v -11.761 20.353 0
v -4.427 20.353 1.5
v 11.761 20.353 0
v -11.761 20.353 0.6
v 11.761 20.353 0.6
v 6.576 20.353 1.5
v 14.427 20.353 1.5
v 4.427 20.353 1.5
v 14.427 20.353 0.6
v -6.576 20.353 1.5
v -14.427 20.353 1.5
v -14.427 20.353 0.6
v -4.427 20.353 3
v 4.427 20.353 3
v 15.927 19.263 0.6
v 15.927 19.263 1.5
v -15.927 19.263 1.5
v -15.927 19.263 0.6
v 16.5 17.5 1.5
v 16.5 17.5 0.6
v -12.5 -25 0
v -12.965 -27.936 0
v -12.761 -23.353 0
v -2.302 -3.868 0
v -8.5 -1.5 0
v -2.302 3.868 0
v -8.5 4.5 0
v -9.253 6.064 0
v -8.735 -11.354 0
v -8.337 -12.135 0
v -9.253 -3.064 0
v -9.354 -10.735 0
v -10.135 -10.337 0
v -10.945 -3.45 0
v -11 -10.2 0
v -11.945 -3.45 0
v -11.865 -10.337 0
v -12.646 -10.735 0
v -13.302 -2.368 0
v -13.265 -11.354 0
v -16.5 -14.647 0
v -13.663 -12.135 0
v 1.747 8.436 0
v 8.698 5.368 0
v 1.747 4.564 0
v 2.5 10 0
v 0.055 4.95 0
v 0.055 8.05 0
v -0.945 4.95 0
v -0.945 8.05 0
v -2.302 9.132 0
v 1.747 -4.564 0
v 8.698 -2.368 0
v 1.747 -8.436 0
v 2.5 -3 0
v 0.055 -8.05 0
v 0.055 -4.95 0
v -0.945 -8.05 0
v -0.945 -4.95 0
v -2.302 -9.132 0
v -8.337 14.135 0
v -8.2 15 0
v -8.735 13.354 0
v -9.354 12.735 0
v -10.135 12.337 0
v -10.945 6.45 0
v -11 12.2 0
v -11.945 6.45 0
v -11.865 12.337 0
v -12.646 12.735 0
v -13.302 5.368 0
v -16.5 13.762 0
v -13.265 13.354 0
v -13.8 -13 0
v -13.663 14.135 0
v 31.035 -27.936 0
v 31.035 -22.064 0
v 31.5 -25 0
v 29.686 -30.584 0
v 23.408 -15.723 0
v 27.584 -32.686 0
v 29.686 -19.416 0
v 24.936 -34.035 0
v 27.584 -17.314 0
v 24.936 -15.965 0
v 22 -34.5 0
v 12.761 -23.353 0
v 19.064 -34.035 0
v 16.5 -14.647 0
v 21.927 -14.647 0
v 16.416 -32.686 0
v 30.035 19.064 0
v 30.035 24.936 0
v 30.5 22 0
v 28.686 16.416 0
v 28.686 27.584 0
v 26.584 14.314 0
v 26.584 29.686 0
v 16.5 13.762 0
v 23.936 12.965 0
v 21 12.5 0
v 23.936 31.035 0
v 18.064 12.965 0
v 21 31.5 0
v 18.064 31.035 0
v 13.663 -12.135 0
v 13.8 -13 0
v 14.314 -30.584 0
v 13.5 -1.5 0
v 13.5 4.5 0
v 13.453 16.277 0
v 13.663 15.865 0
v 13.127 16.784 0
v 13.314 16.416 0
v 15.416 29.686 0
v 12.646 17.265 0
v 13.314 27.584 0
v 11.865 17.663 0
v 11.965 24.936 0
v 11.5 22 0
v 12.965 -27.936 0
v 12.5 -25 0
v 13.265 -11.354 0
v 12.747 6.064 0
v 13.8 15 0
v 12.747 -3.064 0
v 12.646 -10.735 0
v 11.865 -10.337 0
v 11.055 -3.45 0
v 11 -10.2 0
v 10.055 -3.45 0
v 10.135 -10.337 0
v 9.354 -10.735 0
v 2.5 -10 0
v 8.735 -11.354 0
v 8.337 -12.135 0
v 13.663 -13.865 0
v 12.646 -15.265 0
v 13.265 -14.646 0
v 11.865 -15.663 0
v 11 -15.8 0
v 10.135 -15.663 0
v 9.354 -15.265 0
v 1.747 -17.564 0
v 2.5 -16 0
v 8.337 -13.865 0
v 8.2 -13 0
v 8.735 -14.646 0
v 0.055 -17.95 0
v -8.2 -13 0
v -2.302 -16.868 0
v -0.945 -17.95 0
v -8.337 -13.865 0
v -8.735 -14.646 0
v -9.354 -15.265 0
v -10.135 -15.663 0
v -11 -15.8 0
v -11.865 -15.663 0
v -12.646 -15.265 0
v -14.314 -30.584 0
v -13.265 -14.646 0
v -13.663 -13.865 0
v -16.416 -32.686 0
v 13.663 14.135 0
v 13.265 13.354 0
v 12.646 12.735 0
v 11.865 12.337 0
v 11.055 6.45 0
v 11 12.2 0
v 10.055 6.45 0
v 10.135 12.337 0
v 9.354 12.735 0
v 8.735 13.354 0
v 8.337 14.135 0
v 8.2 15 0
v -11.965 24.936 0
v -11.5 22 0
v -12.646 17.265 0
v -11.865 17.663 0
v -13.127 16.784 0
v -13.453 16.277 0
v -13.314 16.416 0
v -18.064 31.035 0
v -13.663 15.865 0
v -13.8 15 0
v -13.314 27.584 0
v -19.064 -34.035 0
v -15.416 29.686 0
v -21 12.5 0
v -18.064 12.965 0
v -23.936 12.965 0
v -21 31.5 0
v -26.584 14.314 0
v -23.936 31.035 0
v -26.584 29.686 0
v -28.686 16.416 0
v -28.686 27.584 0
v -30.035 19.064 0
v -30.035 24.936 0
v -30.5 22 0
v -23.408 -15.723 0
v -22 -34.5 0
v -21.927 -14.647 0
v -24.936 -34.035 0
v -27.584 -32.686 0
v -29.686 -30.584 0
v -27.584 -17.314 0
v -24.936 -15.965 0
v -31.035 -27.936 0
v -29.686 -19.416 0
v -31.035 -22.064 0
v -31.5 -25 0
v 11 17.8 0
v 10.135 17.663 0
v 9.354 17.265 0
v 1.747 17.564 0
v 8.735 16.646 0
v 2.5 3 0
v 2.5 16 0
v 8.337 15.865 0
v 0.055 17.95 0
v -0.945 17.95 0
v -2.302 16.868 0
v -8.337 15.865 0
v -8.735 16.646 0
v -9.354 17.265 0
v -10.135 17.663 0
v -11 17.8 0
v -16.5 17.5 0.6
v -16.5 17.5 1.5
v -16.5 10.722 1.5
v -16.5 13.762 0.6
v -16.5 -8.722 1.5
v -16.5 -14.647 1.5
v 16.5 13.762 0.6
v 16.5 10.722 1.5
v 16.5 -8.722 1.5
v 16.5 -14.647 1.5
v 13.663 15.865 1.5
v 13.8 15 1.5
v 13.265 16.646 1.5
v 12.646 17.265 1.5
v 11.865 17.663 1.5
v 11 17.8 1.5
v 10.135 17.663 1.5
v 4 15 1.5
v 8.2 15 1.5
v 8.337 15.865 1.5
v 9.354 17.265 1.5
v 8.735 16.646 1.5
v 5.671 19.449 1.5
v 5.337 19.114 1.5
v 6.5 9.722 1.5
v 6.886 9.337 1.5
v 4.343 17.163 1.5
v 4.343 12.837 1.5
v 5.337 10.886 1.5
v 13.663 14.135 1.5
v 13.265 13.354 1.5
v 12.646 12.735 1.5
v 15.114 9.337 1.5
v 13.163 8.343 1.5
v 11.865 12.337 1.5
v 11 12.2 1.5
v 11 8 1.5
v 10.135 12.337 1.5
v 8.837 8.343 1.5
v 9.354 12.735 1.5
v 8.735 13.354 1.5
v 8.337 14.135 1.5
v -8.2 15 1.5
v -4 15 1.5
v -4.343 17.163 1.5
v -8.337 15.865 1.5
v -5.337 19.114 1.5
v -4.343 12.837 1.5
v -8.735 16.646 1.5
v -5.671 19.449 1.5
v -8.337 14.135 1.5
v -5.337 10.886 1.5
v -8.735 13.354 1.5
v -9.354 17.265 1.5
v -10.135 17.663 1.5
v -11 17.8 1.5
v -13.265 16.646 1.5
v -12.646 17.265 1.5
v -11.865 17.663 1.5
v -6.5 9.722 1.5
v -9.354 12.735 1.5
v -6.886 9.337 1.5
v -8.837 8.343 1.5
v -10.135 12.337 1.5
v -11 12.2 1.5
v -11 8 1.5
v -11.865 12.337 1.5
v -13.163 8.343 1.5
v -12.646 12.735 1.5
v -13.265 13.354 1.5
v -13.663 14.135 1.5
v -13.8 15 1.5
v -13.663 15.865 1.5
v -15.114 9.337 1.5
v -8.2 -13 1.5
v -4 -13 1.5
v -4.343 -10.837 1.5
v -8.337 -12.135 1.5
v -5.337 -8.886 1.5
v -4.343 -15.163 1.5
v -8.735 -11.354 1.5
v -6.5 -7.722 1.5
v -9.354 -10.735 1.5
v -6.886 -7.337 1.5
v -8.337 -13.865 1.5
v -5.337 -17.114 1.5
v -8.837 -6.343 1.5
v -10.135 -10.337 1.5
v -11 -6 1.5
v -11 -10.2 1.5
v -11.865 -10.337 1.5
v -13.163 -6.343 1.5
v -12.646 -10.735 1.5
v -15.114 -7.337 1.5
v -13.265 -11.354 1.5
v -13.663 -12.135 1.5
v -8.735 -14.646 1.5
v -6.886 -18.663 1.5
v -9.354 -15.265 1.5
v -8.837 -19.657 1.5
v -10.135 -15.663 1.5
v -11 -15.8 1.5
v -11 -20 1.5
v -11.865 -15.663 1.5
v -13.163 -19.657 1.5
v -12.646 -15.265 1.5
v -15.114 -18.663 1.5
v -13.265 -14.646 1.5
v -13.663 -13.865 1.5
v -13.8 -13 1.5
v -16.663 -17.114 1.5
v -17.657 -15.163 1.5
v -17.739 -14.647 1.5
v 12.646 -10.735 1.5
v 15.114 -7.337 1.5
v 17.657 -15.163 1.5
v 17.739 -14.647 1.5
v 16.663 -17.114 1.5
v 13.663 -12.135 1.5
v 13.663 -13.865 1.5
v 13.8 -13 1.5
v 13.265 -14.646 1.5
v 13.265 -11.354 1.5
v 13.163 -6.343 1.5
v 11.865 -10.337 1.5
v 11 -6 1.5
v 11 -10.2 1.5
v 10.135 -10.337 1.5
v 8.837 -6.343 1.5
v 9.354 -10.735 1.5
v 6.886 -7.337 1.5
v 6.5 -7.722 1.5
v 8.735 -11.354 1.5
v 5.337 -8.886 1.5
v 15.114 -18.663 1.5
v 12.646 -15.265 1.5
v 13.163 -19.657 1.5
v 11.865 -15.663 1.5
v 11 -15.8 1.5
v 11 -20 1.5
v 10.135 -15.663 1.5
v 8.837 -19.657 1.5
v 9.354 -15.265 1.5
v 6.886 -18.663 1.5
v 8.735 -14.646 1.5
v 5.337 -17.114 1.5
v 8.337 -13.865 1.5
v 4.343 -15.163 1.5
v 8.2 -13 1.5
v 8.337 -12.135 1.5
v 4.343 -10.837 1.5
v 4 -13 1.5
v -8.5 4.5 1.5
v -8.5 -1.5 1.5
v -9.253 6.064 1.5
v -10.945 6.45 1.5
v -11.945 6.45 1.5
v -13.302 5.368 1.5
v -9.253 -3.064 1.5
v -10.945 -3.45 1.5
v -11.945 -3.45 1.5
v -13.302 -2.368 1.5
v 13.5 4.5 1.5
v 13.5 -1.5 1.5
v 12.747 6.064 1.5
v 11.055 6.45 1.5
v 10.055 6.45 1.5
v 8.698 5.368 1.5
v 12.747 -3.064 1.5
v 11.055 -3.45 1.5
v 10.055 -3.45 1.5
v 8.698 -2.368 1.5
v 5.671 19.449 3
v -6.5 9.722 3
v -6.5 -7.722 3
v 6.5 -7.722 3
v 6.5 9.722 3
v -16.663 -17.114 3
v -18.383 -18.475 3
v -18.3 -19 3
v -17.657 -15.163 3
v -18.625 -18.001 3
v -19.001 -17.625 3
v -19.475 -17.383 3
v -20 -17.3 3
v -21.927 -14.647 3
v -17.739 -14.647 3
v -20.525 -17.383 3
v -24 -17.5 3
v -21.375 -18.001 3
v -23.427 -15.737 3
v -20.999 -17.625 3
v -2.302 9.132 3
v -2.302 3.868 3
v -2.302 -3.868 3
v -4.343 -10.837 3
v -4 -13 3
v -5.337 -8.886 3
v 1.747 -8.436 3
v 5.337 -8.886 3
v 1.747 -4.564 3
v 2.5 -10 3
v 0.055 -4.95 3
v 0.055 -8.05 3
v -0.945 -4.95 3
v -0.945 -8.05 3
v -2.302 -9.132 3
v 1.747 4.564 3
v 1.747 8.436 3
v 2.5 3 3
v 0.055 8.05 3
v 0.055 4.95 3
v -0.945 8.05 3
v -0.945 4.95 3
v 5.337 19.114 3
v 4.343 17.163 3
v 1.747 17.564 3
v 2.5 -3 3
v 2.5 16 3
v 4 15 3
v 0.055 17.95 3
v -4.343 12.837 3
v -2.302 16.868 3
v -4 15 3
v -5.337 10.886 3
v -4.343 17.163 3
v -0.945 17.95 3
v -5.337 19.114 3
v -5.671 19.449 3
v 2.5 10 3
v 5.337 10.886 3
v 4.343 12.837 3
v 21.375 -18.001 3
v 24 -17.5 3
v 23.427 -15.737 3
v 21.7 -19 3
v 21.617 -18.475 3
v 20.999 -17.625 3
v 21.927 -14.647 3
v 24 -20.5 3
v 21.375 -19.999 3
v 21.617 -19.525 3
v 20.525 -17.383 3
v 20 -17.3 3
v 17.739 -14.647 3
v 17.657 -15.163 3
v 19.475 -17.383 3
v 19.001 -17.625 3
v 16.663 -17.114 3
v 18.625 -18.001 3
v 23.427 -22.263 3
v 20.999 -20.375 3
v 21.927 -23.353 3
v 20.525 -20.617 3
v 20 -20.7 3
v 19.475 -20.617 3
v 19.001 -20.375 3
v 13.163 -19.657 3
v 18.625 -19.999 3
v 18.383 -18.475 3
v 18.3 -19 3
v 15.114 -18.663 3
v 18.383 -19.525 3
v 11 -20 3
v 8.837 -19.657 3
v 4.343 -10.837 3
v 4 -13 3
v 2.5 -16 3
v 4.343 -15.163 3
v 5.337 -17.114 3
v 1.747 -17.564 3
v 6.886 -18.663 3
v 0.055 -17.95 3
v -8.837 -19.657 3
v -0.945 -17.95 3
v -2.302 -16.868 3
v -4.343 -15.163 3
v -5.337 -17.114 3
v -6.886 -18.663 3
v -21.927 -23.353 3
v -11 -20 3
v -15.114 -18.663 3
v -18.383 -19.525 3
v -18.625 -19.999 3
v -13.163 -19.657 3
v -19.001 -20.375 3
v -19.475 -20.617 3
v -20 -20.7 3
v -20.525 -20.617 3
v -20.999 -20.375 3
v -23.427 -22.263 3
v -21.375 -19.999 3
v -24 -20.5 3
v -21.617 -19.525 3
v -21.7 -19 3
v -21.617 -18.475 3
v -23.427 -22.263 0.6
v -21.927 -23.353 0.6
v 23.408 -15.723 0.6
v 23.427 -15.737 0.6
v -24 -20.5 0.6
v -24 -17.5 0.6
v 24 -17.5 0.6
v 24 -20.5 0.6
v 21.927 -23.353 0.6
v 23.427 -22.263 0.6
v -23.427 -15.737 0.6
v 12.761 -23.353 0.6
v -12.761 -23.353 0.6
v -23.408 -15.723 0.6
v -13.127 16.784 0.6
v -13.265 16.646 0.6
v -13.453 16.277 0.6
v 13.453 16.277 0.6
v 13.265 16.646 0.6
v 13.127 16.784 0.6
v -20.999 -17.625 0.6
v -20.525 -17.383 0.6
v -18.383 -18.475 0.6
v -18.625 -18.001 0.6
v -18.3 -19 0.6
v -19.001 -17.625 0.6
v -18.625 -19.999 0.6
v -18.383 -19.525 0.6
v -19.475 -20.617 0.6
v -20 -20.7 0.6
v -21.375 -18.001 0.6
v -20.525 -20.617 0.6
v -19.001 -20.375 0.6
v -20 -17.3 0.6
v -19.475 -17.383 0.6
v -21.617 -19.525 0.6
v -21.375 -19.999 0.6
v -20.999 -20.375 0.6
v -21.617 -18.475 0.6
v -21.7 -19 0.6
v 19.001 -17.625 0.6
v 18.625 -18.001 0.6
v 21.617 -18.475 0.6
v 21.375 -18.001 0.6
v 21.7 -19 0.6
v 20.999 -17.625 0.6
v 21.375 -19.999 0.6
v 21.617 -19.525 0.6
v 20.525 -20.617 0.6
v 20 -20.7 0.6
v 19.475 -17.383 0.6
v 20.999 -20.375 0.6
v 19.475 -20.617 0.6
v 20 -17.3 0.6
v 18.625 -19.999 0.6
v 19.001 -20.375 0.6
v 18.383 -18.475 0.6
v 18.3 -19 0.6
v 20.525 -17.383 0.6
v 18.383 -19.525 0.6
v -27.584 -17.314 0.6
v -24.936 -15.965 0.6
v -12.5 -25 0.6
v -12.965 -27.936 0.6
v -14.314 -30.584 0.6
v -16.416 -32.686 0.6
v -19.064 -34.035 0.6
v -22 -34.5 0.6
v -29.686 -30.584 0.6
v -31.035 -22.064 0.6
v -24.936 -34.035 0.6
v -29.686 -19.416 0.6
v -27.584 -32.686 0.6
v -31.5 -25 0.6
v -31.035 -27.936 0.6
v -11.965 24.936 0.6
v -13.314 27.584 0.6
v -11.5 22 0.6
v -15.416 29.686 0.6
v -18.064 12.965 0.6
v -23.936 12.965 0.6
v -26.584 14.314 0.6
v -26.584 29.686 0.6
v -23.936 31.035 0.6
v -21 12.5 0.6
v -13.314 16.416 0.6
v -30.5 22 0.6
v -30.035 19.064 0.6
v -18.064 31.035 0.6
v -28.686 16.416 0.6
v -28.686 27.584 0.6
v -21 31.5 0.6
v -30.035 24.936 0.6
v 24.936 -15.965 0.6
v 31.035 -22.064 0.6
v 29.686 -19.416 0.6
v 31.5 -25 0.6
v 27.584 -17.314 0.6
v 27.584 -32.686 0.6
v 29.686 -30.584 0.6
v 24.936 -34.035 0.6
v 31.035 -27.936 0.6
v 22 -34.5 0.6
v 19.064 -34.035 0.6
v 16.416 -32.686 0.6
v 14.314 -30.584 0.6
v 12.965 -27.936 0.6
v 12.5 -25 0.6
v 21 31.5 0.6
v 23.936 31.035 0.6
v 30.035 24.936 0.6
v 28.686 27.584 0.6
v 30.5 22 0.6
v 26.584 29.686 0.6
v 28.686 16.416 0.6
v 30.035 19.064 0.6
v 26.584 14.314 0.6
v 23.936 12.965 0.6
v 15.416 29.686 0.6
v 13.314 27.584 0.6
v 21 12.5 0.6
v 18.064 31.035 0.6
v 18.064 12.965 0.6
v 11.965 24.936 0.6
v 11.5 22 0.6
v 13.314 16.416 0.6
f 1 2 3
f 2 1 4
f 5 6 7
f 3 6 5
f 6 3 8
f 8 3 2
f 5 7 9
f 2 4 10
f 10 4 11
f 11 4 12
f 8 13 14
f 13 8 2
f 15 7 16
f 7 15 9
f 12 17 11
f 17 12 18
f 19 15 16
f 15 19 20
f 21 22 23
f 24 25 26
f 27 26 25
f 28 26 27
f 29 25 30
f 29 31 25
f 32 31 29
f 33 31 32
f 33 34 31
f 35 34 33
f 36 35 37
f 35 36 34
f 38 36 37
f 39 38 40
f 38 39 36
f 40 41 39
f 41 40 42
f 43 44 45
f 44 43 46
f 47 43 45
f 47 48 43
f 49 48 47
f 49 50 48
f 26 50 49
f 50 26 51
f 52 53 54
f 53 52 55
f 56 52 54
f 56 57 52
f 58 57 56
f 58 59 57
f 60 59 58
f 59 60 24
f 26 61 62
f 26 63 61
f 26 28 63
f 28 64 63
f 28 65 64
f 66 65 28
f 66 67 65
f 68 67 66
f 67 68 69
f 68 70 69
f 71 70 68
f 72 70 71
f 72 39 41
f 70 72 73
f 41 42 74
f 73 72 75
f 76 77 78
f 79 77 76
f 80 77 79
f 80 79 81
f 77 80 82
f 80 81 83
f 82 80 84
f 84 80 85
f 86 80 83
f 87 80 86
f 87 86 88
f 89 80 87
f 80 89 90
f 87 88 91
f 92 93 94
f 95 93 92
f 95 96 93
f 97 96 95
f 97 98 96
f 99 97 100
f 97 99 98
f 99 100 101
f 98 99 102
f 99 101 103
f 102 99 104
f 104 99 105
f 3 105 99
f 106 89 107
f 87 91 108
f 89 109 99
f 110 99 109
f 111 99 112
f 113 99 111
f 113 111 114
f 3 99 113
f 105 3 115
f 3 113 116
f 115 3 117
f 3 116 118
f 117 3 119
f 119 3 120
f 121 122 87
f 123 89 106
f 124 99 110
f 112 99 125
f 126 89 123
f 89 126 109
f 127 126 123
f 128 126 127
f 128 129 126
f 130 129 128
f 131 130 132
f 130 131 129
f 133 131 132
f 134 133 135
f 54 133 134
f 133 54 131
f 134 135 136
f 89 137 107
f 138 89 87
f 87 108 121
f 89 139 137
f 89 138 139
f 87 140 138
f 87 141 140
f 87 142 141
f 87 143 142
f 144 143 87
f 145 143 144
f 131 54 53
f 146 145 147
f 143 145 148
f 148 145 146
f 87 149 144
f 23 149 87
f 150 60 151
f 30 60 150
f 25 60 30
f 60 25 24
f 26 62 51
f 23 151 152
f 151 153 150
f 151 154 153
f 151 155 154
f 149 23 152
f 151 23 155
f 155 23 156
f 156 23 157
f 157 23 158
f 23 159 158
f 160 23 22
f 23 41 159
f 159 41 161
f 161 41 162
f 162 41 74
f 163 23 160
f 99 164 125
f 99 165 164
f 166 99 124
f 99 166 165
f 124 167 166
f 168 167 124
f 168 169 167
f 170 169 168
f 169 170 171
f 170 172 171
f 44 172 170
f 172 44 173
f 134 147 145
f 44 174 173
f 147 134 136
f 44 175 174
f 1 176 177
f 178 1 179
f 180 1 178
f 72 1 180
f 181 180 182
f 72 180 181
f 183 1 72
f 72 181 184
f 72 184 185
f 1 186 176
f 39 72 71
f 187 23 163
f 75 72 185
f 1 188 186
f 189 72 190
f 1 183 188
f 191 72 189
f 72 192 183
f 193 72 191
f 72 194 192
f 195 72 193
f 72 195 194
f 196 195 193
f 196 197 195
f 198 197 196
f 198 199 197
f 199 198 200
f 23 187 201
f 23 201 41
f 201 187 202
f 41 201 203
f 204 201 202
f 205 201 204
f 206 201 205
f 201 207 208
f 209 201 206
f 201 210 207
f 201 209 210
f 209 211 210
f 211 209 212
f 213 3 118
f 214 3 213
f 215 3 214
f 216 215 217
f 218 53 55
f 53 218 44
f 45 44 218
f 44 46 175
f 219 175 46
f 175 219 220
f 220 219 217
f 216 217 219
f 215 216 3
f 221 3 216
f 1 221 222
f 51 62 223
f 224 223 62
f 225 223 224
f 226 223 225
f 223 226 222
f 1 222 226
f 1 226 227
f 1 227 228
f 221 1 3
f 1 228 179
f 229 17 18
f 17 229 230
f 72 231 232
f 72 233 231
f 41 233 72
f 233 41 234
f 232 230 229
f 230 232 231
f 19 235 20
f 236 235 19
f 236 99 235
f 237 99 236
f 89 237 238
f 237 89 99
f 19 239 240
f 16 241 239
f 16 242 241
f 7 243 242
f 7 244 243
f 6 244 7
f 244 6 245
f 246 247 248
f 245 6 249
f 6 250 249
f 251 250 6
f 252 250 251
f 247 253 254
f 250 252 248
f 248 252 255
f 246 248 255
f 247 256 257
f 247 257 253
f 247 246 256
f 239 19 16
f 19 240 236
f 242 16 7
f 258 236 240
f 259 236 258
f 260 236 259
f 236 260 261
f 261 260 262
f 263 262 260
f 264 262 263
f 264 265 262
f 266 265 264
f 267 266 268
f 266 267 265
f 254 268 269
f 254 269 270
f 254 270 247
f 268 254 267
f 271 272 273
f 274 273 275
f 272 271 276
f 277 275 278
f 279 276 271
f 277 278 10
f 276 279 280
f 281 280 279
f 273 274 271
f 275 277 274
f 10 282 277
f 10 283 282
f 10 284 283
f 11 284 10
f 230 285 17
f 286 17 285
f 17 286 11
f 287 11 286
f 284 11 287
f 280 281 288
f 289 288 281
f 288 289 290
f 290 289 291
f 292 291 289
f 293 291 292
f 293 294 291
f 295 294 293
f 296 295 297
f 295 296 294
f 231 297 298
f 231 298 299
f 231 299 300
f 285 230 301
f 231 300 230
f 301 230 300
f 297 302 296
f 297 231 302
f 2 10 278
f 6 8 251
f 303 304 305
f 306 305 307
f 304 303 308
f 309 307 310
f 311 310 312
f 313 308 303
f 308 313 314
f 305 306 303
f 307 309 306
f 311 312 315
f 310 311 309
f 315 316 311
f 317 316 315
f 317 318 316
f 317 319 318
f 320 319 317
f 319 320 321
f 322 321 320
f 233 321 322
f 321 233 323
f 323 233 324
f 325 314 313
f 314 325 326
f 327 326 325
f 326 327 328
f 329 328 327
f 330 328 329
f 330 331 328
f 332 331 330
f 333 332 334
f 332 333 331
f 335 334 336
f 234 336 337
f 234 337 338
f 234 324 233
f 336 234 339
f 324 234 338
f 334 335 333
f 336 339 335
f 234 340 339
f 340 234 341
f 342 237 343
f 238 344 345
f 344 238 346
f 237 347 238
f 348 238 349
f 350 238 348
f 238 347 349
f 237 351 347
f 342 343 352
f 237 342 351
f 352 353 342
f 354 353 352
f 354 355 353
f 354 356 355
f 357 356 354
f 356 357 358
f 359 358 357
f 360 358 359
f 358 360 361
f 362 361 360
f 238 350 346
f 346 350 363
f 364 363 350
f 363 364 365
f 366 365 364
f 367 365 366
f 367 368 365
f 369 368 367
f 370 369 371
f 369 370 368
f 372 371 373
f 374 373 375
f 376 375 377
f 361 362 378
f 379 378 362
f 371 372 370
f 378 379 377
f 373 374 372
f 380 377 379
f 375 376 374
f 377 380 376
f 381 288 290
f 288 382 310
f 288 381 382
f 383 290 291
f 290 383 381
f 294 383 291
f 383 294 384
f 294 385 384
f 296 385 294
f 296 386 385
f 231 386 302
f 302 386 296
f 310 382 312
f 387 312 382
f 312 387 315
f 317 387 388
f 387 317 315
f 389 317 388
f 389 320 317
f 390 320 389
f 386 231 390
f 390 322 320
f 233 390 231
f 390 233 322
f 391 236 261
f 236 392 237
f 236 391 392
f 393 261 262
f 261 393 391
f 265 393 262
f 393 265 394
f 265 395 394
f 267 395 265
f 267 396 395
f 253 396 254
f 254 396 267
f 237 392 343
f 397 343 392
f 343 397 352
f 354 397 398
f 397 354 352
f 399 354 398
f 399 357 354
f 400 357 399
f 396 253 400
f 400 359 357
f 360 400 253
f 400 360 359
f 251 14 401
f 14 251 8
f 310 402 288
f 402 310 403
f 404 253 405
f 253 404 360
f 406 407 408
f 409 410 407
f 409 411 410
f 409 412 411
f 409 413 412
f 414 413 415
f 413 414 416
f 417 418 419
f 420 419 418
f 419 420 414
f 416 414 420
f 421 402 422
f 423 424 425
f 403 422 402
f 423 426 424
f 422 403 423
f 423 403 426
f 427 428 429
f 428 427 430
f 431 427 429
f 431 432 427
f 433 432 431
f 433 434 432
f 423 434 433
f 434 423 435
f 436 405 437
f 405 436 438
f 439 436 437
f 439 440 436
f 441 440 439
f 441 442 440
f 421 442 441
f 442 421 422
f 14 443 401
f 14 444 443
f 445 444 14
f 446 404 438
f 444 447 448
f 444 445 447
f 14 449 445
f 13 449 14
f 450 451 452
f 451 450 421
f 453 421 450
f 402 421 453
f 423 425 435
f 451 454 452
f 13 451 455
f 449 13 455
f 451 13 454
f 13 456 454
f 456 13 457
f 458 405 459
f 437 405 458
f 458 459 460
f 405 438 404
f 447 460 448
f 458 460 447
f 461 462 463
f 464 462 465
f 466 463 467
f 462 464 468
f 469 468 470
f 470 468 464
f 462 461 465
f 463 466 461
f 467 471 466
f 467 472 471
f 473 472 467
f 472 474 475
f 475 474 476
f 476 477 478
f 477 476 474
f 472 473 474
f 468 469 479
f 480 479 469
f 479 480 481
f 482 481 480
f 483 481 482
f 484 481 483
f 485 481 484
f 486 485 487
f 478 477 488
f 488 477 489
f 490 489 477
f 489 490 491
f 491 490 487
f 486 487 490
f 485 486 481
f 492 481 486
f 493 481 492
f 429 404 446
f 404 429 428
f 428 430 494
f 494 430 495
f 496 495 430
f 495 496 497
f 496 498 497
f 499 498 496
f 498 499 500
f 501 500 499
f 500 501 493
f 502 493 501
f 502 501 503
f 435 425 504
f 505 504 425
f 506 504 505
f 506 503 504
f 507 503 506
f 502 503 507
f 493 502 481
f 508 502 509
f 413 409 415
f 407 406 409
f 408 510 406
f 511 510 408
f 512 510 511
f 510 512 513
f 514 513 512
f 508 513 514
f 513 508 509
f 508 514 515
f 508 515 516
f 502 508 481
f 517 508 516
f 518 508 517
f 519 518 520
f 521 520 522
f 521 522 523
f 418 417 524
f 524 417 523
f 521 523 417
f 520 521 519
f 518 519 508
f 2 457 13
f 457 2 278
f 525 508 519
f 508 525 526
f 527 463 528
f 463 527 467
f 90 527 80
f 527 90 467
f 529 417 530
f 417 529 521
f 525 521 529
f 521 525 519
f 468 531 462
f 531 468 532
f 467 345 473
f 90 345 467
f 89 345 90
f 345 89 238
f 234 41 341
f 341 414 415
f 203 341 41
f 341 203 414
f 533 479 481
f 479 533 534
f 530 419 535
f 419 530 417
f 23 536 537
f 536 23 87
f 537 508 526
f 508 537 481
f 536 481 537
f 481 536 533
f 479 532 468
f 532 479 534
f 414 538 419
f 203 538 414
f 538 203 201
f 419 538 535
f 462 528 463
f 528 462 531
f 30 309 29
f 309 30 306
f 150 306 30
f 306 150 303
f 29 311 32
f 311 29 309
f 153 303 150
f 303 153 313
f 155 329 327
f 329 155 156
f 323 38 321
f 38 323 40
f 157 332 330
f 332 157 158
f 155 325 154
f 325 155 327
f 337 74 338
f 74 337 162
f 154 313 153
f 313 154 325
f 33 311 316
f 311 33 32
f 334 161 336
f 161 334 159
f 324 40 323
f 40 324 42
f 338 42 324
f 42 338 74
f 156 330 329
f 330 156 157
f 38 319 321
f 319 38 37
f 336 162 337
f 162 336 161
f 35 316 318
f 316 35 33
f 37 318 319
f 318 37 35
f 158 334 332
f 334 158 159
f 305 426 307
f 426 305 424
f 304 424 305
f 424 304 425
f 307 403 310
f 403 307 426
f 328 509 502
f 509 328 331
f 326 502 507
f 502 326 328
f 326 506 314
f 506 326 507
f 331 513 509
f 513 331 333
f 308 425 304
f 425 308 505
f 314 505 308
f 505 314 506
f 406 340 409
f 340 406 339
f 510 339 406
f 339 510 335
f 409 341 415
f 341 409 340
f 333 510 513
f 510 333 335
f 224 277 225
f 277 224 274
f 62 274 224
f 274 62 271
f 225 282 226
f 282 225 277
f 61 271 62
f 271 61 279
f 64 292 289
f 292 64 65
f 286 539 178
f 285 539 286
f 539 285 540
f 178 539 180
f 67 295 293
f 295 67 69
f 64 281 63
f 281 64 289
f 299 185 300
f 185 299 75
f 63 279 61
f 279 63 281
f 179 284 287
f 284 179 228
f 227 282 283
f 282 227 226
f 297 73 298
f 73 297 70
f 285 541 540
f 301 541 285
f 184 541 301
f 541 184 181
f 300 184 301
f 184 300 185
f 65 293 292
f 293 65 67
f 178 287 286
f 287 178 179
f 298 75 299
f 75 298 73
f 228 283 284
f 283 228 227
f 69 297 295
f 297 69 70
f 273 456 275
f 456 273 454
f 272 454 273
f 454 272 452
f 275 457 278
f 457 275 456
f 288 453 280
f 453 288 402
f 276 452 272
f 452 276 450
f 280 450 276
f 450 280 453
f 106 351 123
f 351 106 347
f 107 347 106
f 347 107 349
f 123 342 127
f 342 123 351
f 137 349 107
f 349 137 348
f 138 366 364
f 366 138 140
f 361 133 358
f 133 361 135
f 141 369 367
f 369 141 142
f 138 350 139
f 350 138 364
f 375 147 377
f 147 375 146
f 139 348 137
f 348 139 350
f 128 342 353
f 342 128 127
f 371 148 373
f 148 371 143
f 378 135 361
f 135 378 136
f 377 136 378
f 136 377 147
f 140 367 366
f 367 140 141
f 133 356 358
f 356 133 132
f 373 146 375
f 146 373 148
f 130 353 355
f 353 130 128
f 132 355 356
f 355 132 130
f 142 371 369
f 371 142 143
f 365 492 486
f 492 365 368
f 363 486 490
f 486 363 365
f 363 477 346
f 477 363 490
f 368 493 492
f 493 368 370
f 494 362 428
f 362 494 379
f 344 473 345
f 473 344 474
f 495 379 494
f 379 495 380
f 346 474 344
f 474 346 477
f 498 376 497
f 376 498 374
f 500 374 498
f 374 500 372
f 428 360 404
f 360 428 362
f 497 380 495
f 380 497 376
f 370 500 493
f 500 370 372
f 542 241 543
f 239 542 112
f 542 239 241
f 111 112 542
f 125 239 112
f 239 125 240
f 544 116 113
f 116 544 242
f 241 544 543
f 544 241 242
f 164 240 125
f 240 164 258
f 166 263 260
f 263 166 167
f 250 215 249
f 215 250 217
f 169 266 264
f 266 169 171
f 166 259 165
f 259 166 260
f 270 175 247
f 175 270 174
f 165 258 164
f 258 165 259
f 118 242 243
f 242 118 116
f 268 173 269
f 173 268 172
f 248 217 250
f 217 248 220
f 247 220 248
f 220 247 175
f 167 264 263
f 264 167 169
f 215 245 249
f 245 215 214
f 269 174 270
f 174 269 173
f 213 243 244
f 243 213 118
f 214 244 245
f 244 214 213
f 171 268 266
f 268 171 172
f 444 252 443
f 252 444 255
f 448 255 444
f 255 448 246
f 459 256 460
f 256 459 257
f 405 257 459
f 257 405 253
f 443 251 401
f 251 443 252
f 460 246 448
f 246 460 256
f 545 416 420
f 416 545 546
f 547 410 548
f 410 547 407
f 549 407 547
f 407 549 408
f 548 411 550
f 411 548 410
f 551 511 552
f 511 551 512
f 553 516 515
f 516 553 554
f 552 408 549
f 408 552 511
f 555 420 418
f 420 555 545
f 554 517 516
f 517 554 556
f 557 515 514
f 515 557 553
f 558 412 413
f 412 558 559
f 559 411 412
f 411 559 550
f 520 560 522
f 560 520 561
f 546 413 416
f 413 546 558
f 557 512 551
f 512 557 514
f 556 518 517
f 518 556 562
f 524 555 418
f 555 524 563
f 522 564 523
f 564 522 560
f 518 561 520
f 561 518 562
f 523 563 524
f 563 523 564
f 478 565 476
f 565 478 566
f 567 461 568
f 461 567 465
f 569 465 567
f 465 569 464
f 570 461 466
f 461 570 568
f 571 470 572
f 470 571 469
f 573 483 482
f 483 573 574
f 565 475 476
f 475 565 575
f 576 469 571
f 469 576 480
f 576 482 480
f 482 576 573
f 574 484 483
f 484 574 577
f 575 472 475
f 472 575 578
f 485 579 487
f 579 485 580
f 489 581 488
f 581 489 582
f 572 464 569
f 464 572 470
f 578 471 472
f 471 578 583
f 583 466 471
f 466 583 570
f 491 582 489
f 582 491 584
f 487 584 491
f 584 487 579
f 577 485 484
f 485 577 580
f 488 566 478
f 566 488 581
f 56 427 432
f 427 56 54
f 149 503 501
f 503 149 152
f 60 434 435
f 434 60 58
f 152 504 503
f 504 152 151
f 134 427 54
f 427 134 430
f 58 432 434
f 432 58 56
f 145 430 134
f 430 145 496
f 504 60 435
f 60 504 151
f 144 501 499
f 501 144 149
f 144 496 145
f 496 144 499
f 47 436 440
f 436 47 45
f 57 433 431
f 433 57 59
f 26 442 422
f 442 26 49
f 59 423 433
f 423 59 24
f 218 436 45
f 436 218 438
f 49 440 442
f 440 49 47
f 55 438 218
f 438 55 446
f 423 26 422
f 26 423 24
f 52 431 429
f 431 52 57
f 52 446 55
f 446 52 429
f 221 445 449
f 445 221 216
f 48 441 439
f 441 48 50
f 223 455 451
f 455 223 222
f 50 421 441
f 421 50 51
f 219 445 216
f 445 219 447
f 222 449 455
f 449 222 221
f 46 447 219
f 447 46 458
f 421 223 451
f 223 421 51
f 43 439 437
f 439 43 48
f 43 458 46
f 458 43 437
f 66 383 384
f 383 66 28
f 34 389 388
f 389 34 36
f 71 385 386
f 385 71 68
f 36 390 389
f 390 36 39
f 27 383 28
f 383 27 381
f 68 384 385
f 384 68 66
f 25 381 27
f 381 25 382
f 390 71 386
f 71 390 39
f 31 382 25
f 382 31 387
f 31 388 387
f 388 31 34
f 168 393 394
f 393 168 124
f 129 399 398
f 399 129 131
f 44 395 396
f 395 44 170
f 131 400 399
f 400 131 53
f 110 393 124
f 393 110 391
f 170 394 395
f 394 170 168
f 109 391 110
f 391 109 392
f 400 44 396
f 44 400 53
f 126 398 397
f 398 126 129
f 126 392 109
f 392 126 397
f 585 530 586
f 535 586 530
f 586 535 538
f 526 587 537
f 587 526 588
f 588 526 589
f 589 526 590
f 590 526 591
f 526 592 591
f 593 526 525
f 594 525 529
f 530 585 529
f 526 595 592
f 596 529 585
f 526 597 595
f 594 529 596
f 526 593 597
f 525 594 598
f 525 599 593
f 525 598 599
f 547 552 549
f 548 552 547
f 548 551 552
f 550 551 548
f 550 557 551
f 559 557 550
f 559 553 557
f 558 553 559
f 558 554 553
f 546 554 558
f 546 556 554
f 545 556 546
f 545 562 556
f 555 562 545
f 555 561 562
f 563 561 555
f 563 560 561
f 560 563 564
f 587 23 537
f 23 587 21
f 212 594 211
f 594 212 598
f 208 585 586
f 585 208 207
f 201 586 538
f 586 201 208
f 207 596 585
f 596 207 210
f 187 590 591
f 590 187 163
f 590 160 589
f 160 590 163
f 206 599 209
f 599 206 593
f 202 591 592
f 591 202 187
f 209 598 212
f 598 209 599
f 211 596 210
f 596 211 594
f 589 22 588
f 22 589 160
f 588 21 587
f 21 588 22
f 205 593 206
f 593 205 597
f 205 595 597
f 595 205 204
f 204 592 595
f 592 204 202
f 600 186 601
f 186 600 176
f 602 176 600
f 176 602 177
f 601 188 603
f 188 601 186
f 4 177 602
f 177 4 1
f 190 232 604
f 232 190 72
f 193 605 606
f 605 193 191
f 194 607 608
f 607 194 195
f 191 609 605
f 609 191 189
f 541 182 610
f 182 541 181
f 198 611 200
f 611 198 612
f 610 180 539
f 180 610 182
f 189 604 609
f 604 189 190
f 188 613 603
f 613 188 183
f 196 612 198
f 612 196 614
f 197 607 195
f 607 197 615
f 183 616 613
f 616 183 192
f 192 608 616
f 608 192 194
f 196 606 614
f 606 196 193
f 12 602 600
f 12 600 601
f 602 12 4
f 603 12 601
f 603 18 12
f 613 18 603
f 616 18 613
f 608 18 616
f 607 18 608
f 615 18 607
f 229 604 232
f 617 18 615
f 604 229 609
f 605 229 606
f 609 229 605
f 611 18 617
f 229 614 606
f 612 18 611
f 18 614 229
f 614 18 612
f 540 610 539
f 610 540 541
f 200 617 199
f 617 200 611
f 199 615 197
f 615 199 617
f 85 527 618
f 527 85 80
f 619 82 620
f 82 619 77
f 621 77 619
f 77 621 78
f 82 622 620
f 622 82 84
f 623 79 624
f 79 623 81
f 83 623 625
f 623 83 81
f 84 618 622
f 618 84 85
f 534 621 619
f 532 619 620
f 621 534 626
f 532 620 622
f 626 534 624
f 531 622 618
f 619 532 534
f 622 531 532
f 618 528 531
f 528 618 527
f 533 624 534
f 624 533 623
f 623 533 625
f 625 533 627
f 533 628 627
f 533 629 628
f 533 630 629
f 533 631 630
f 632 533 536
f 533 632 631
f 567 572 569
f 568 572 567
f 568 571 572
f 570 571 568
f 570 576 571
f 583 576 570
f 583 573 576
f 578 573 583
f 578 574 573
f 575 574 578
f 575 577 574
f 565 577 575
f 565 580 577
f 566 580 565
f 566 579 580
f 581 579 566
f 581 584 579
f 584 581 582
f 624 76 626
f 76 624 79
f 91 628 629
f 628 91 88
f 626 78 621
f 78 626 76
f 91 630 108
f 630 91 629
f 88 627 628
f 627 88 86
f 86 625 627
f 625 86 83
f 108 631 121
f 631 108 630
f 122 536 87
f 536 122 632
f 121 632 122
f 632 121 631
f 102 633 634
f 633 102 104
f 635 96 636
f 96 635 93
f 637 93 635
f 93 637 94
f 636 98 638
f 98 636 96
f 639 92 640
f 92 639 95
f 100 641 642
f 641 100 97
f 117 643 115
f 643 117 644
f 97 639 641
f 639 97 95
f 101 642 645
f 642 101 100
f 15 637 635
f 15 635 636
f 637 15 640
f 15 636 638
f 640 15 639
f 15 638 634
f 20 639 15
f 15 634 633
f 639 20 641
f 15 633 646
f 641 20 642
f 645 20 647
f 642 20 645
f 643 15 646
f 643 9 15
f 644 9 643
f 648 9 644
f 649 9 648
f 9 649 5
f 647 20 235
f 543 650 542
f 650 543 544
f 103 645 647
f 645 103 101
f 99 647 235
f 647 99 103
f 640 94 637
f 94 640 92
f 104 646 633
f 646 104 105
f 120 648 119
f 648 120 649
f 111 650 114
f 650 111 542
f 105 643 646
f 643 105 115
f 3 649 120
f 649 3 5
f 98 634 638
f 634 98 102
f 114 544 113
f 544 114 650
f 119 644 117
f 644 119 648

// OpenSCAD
// file: dronePlates.scad
/**
 * dronePlates.scad
 * Plate library
 *
 * GNU GPL V3
 * @author: Victor Potenciano
 */

m3Rad = 3.4/2;
cornerR = 4;

/**
 *
 */
module helperDisk(diameter) {
	cylinder(r = diameter/2, h = 0.6, $fn=20);
}

/**
 *
 */
module roundedRect(size, radius) {
	x = size[0];
	y = size[1];
	z = size[2];

	linear_extrude(height=z)
	hull() {
	// place 4 circles in the corners, with the given radius
	translate([(-x/2)+(radius/2), (-y/2)+(radius/2), 0]){ circle(r=radius); }
	translate([(x/2)-(radius/2), (-y/2)+(radius/2), 0]){ circle(r=radius); }
	translate([(-x/2)+(radius/2), (y/2)-(radius/2), 0]){ circle(r=radius); }
	translate([(x/2)-(radius/2), (y/2)-(radius/2), 0]){ circle(r=radius); }
	}
}

/**
 * rounded rectangle triangle with corner at origin
 */
module roundedTriangle(size, radius) {
	x = size[0];
	y = size[1];
	z = size[2];

	linear_extrude(height=z)
	hull() {
	translate([radius, radius, 0]){ circle(r=radius); }
	translate([x-radius, radius, 0]){ circle(r=radius); }
	translate([radius, y-radius, 0]){ circle(r=radius); }
	}
}

/**
 *
 */
module roundRectPlate(w, l, plateThick=3) {
	difference(){
		roundedRect([l+m3Rad*1.75,w+m3Rad*1.75,plateThick], cornerR);
		translate([l/2, w/2, -0.5]) { cylinder(h = plateThick+1, r = m3Rad, $fn=30); }
		translate([-l/2, w/2, -0.5]) { cylinder(h = plateThick+1, r = m3Rad, $fn=30); }
		translate([l/2, -w/2, -0.5]) { cylinder(h = plateThick+1, r = m3Rad, $fn=30); }
		translate([-l/2, -w/2, -0.5]) { cylinder(h = plateThick+1, r = m3Rad, $fn=30); }
	}
}

/**
 *
 */
module crossSquarePlate(l, thick=3) {
	inDist = cornerR*2+4;
	trianL = sqrt((l*l)/2)-inDist;
	centerR = 4;

	difference(){
		roundRectPlate(l, l, thick);
		translate([0, centerR, -0.5]) { 
			rotate([0,0,45]){ roundedTriangle([trianL,trianL,thick+1], cornerR-2); }
		}
		translate([0, -centerR, -0.5]) { 
			rotate([0,0,225]){ roundedTriangle([trianL,trianL,thick+1], cornerR-2); }
		}
		translate([-centerR, 0, -0.5]) { 
			rotate([0,0,135]){ roundedTriangle([trianL,trianL,thick+1], cornerR-2); }
		}
		translate([centerR, 0, -0.5]) { 
			rotate([0,0,-45]){ roundedTriangle([trianL,trianL,thick+1], cornerR-2); }
		}
	}
}

/**
 *
 */
module hShapePlate(w, l, thick=4) {
	inDist = cornerR*2+1;

	difference(){
		roundRectPlate(w, l, thick);
		translate([0, w/4, -0.5]) { roundedRect([l-inDist,w/2-inDist,thick+1], cornerR-2); }
		translate([0, -w/4, -0.5]) { roundedRect([l-inDist,w/2-inDist,thick+1], cornerR-2); }
	}
}

/**
 *
 */
module motorCircleMount(inDia, outDia, thick=3, extraH=false, d1=19, d2=16, holeR=m3Rad ) {
	difference(){
		cylinder(h = thick, r = outDia/2, $fn=30);
		motorCircleMountHoles(inDia, outDia, thick, extraH, d1=d1, d2=d2, holeR=holeR);
	}
}

/**
 *
 */
module motorCircleMountHoles(inDia, outDia, thick=3, extraH=false, d1=19, d2=16, d3=25, holeR=m3Rad) {
	translate([0, 0, -0.5]) { cylinder(h = thick+1, r = inDia/2, $fn=30); }

	for(i=[0:3]) {
		rotate([0,0,90*i]){
		translate([d1/2, 0, -0.5]) cylinder(h = thick+1, r = holeR, $fn=20);
		translate([d2/2, 0, -0.5]) cylinder(h = thick+1, r = holeR, $fn=20);
		translate([d2/2, -holeR, -0.5]) cube(size = [(d1-d2)/2,holeR*2,thick+1]);
		}
	}
	
	if(extraH==true){	
		for(i=[-1,1]) translate([i*d3/2, 0, -0.5]) { cylinder(h = thick+1, r = holeR, $fn=30); }
	}
}

/**
 *
 */
module motorRectMount(w, l, inDia, thick=3) {
	d1=19;
	d2=16;

	difference(){
		roundRectPlate(w, l, thick);
		translate([0, 0, -0.5]) { cylinder(h = thick+1, r = inDia/2, $fn=30); }
		translate([0, d1/2, -0.5]) { cylinder(h = thick+1, r = m3Rad, $fn=30); }
		translate([0, -d1/2, -0.5]) { cylinder(h = thick+1, r = m3Rad, $fn=30); }
		translate([d2/2, 0, -0.5]) { cylinder(h = thick+1, r = m3Rad, $fn=30); }
		translate([-d2/2, 0, -0.5]) { cylinder(h = thick+1, r = m3Rad, $fn=30); }
	}
}

/**
 *
 */
module tube(inDia, outDia, height) {
	difference(){
		cylinder(h = height, r = outDia/2, $fn=50);
		translate([0, 0, -0.5]) { cylinder(h = height+1, r = inDia/2, $fn=30); }
	}
}

/**
 *
 */
module squareTube(inDia, outDia, height) {
	translate([0,0,height/2]){
	difference(){
		cube(size = [outDia,outDia,height], center = true);
		cube(size = [inDia,inDia,height+1], center = true);
	}
	}
}

/**
 *
 */
module djiFlamewheelHoles(height) {
	a = 23;
	b = 16;
	c = 19.5;
	
	translate([a/2, c/2, 0]) { cylinder(h = height, r = m3Rad, $fn=30); }
	translate([-a/2, c/2, 0]) { cylinder(h = height, r = m3Rad, $fn=30); }
	translate([b/2, -c/2, 0]) { cylinder(h = height, r = m3Rad, $fn=30); }
	translate([-b/2, -c/2, 0]) { cylinder(h = height, r = m3Rad, $fn=30); }
}

/**
 *
 */
module djiFlamewheelHolesBotton(height) {
	a1 = 21;
	c = 19.5;
	
	translate([a1/2, c/2, 0]) { cylinder(h = height, r = m3Rad, $fn=30); }
	translate([-a1/2, c/2, 0]) { cylinder(h = height, r = m3Rad, $fn=30); }
}

/**
 *
 */
module propeller(size){
union(){
difference(){
	cylinder(h = 3, r = size/2, center=true, $fn=30);
	cylinder(h = 3.1, r = size/2-2, center=true, $fn=30); 
}
for( i = [-1,1] ){
rotate([0,0,45*i]){ cube(size = [size,4,1], center = true); }
}
}
}

/**
 *
 */
module slot(length, height, rad){
for(i=[-1,1]) translate([i*length/2,0,0]) cylinder(h = height, r = rad, $fn=30);
translate([0,0,height/2]) cube(size = [length,rad*2,height], center = true);
}

 

////////////////////////
// Examples:
////////////////////////

motorCircleMount(8, 25, 3.5);

//roundedRect([50,50,3], 4);

//hShapePlate(79, 25);

//rotate([0,0,45]){roundedTriangle([40,40,3], 4);}

//crossSquarePlate(45, 4);

/*
union(){
motorRectMount(21, 18, 8, 4);
translate([9, 10.5, 0]) {tube(m3Rad*2, 6.5, 6);}
}
*/

/*
difference(){
union(){
hShapePlate(50, 30, 3.5);
translate([-4,-25,0]){cube(size = [8,50,3.5]);}
rotate([0, 0, 45]) {motorCircleMount(8, 35, 3.5);}
}
cylinder(h = 10, r = 4, $fn=100, center=true);
}
*/

//rotate([90,0,0]){ tube(5,10,20); }
//translate([20,0,0]){ squareTube(5, 10, 20); }
// main file
/**
 * top mount for mobius using zmr250 pattern
 */

use <dronePlates.scad>;

m3Rad = 3.4/2;
plateThick = 1.5;
frHolesD = 19;

difference(){
union(){
	roundedRect([30,38,plateThick],3);
	roundedRect([10,38,plateThick+1.5],3);
	translate([0,-frHolesD,0]) roundedRect([45,6,plateThick+1.5],3);
}

translate([0,1,0])
for ( i = [-1,1]) for ( j = [-1,1]){ //mobius bobbins holes
	translate([i*22/2,j*28/2,-0.5]){
		cylinder(r=5.6/2,h=plateThick+1,$fn=20);
		translate([0,0,plateThick+0.5]) cylinder(r=7,h=plateThick,$fn=20);
	}
}

//frame attach holes
for ( i = [-1,1]) translate([i*20,-frHolesD,-0.5]) cylinder(r=m3Rad,h=plateThick+2,$fn=20);

//voids
for ( i = [-1:1]) translate([0,i*13,-0.5]) roundedRect([3,8,plateThick+2],2);
for ( i = [-1,1]) translate([i*11,1.5,-0.5]) roundedRect([3,8,plateThick+2],2);

}//diff

for(i=[-1,1]){
translate([i*22,-(frHolesD+6),0]) helperDisk(19);
translate([i*21,22,0]) helperDisk(19);
}
